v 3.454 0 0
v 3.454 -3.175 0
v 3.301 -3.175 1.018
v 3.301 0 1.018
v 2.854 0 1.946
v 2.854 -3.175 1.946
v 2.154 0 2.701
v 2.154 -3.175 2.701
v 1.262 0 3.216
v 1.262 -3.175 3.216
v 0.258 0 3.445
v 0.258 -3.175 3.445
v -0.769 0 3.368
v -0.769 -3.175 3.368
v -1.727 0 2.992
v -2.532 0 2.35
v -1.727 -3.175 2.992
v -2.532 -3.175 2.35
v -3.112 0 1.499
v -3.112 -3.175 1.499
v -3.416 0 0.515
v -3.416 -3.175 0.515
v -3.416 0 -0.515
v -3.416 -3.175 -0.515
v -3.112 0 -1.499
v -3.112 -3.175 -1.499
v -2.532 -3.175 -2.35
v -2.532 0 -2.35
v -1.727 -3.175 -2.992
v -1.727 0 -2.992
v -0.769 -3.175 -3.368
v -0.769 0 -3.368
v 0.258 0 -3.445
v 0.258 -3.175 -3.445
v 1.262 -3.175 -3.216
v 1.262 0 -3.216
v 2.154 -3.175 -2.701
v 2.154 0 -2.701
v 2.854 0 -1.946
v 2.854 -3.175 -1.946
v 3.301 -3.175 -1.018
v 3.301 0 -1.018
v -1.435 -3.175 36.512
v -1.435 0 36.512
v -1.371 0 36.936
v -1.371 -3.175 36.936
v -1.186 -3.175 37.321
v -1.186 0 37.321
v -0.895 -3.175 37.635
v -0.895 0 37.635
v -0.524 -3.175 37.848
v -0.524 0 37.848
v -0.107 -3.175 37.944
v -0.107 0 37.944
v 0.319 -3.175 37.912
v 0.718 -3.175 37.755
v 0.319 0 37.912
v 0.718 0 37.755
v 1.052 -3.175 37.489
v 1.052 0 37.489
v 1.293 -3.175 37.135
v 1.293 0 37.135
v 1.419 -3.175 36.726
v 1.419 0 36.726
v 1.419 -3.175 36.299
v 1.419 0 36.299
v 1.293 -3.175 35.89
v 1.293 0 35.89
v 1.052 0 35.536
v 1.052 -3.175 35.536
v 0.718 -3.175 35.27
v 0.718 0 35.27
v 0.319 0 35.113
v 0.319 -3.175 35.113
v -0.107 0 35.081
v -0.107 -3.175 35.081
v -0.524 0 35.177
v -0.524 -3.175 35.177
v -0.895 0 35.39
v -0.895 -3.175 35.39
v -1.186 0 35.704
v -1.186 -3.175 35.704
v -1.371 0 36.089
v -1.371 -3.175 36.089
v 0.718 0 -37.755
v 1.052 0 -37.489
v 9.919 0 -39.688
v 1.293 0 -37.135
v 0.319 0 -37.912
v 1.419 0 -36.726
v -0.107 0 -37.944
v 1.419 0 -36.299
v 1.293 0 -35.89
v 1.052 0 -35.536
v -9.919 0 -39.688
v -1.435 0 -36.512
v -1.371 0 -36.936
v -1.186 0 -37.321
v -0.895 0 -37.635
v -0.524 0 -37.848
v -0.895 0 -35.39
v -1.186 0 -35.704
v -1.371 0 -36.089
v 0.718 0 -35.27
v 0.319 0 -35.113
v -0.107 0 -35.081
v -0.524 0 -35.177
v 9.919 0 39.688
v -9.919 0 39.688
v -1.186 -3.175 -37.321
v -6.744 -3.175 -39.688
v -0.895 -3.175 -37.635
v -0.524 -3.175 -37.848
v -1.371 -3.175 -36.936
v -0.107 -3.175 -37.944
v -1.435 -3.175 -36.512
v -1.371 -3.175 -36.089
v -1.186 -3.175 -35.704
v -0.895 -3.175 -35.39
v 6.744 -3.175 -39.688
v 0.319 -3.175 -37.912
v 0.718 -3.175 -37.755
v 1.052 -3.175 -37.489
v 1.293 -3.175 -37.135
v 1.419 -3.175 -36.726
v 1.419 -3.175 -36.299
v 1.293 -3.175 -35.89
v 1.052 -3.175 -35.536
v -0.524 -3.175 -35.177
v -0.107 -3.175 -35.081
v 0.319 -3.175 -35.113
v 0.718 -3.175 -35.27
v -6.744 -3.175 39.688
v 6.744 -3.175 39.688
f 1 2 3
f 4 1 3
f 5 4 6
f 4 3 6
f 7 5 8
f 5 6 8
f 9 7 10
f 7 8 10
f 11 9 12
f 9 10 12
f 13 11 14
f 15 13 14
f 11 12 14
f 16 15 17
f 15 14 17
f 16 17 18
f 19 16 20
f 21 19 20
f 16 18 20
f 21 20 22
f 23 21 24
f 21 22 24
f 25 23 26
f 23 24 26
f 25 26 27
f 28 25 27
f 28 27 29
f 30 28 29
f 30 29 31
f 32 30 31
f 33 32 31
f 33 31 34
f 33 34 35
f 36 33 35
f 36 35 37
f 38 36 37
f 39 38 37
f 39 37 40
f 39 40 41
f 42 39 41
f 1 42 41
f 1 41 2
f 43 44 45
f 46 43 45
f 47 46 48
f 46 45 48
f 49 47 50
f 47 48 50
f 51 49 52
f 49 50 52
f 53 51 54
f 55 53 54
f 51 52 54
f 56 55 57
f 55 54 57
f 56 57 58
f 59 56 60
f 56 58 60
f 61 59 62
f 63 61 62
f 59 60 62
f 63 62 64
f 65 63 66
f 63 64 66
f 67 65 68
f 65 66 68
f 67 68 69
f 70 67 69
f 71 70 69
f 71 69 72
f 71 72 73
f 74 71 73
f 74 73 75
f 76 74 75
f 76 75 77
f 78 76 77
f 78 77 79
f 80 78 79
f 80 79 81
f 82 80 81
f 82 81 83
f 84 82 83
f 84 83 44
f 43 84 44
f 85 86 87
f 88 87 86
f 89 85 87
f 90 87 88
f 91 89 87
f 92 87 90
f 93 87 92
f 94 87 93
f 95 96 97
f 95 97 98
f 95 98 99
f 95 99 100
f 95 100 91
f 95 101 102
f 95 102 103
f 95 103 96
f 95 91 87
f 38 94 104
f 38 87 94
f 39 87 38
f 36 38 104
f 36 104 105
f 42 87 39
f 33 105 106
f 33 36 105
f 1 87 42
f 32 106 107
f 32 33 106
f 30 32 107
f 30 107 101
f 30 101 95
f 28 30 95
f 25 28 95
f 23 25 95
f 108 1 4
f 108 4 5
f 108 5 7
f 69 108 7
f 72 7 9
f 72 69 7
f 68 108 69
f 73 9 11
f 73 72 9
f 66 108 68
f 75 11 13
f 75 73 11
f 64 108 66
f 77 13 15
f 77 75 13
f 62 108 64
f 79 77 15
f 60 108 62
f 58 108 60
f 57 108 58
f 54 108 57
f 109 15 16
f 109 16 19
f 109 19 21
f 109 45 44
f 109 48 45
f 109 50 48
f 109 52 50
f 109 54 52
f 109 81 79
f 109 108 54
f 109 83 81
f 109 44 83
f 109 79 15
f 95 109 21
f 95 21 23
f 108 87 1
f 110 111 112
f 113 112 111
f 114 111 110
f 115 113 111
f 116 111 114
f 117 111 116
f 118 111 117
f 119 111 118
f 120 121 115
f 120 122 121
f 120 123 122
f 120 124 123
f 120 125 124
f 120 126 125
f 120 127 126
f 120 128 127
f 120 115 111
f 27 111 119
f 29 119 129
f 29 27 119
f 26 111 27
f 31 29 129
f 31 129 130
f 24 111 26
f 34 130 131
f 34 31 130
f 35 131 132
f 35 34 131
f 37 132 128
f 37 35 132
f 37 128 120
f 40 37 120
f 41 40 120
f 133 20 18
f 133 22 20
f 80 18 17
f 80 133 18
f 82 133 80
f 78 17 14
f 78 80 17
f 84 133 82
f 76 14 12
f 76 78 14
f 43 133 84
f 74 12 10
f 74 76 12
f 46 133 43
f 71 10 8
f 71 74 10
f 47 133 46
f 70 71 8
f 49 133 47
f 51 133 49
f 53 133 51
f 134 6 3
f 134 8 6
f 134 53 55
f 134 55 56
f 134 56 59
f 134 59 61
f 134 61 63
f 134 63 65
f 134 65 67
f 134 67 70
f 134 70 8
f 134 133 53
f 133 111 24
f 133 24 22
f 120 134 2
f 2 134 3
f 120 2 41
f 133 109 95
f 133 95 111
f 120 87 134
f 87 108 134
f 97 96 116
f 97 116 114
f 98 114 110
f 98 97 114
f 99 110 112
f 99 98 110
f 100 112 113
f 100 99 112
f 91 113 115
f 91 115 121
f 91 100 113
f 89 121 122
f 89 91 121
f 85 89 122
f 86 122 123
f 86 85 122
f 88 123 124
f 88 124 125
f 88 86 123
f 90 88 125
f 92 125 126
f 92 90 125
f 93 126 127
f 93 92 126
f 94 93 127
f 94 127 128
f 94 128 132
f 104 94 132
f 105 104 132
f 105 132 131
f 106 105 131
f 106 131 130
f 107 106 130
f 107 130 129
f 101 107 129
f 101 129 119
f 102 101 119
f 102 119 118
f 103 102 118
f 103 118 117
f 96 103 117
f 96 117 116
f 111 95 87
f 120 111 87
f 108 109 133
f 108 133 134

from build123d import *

# Parameters (mm, degrees)
BOSS_EXTRUDE1_DEPTH      = 39.6875
SKETCH2_R                = 1.4351
CUT_EXTRUDE1_DEPTH       = 42.03119412
F_5_16_24_TAPPED_HOLE1_D = 6.9088


with BuildPart() as part:
    # Sketch1 → Boss-Extrude1 (new body)
    with BuildSketch(Plane.XY):
        Polygon((0, 0), (9.9187, 0), (6.7437, -3.175), (0, -3.175), align=None)
    extrude(amount=BOSS_EXTRUDE1_DEPTH)

    # Mirror1: part across plane


with BuildPart() as part_1:
    add(part.part)
    add(part.part.mirror(Plane(origin=(0, -3.175, 39.6875), x_dir=(0, 0, 1), z_dir=(1, 0, 0))))

    # Sketch2 → Cut-Extrude1 (cut, through all)
    with BuildSketch(Plane(origin=(0, 0, 0), x_dir=(1, 0, 0), z_dir=(0, 1, 0))):
        with Locations(Location((0, -36.5125, 0), (0, 0, 180))):
            Circle(SKETCH2_R)
    extrude(amount=-CUT_EXTRUDE1_DEPTH, mode=Mode.SUBTRACT)

    # Mirror2: part across plane


with BuildPart() as part_2:
    add(part_1.part)
    add(part_1.part.mirror(Plane(origin=(0, 0, 0), x_dir=(1, 0, 0), z_dir=(0, 0, -1))))

    # 5/16-24 Tapped Hole1 (through all)
    with Locations(Plane(origin=(0, 0, 0), x_dir=(-1, 0, 0), z_dir=(0, 1, 0))):
        with Locations((0, 0)):
            Hole(F_5_16_24_TAPPED_HOLE1_D / 2)


solid = part_2.part
